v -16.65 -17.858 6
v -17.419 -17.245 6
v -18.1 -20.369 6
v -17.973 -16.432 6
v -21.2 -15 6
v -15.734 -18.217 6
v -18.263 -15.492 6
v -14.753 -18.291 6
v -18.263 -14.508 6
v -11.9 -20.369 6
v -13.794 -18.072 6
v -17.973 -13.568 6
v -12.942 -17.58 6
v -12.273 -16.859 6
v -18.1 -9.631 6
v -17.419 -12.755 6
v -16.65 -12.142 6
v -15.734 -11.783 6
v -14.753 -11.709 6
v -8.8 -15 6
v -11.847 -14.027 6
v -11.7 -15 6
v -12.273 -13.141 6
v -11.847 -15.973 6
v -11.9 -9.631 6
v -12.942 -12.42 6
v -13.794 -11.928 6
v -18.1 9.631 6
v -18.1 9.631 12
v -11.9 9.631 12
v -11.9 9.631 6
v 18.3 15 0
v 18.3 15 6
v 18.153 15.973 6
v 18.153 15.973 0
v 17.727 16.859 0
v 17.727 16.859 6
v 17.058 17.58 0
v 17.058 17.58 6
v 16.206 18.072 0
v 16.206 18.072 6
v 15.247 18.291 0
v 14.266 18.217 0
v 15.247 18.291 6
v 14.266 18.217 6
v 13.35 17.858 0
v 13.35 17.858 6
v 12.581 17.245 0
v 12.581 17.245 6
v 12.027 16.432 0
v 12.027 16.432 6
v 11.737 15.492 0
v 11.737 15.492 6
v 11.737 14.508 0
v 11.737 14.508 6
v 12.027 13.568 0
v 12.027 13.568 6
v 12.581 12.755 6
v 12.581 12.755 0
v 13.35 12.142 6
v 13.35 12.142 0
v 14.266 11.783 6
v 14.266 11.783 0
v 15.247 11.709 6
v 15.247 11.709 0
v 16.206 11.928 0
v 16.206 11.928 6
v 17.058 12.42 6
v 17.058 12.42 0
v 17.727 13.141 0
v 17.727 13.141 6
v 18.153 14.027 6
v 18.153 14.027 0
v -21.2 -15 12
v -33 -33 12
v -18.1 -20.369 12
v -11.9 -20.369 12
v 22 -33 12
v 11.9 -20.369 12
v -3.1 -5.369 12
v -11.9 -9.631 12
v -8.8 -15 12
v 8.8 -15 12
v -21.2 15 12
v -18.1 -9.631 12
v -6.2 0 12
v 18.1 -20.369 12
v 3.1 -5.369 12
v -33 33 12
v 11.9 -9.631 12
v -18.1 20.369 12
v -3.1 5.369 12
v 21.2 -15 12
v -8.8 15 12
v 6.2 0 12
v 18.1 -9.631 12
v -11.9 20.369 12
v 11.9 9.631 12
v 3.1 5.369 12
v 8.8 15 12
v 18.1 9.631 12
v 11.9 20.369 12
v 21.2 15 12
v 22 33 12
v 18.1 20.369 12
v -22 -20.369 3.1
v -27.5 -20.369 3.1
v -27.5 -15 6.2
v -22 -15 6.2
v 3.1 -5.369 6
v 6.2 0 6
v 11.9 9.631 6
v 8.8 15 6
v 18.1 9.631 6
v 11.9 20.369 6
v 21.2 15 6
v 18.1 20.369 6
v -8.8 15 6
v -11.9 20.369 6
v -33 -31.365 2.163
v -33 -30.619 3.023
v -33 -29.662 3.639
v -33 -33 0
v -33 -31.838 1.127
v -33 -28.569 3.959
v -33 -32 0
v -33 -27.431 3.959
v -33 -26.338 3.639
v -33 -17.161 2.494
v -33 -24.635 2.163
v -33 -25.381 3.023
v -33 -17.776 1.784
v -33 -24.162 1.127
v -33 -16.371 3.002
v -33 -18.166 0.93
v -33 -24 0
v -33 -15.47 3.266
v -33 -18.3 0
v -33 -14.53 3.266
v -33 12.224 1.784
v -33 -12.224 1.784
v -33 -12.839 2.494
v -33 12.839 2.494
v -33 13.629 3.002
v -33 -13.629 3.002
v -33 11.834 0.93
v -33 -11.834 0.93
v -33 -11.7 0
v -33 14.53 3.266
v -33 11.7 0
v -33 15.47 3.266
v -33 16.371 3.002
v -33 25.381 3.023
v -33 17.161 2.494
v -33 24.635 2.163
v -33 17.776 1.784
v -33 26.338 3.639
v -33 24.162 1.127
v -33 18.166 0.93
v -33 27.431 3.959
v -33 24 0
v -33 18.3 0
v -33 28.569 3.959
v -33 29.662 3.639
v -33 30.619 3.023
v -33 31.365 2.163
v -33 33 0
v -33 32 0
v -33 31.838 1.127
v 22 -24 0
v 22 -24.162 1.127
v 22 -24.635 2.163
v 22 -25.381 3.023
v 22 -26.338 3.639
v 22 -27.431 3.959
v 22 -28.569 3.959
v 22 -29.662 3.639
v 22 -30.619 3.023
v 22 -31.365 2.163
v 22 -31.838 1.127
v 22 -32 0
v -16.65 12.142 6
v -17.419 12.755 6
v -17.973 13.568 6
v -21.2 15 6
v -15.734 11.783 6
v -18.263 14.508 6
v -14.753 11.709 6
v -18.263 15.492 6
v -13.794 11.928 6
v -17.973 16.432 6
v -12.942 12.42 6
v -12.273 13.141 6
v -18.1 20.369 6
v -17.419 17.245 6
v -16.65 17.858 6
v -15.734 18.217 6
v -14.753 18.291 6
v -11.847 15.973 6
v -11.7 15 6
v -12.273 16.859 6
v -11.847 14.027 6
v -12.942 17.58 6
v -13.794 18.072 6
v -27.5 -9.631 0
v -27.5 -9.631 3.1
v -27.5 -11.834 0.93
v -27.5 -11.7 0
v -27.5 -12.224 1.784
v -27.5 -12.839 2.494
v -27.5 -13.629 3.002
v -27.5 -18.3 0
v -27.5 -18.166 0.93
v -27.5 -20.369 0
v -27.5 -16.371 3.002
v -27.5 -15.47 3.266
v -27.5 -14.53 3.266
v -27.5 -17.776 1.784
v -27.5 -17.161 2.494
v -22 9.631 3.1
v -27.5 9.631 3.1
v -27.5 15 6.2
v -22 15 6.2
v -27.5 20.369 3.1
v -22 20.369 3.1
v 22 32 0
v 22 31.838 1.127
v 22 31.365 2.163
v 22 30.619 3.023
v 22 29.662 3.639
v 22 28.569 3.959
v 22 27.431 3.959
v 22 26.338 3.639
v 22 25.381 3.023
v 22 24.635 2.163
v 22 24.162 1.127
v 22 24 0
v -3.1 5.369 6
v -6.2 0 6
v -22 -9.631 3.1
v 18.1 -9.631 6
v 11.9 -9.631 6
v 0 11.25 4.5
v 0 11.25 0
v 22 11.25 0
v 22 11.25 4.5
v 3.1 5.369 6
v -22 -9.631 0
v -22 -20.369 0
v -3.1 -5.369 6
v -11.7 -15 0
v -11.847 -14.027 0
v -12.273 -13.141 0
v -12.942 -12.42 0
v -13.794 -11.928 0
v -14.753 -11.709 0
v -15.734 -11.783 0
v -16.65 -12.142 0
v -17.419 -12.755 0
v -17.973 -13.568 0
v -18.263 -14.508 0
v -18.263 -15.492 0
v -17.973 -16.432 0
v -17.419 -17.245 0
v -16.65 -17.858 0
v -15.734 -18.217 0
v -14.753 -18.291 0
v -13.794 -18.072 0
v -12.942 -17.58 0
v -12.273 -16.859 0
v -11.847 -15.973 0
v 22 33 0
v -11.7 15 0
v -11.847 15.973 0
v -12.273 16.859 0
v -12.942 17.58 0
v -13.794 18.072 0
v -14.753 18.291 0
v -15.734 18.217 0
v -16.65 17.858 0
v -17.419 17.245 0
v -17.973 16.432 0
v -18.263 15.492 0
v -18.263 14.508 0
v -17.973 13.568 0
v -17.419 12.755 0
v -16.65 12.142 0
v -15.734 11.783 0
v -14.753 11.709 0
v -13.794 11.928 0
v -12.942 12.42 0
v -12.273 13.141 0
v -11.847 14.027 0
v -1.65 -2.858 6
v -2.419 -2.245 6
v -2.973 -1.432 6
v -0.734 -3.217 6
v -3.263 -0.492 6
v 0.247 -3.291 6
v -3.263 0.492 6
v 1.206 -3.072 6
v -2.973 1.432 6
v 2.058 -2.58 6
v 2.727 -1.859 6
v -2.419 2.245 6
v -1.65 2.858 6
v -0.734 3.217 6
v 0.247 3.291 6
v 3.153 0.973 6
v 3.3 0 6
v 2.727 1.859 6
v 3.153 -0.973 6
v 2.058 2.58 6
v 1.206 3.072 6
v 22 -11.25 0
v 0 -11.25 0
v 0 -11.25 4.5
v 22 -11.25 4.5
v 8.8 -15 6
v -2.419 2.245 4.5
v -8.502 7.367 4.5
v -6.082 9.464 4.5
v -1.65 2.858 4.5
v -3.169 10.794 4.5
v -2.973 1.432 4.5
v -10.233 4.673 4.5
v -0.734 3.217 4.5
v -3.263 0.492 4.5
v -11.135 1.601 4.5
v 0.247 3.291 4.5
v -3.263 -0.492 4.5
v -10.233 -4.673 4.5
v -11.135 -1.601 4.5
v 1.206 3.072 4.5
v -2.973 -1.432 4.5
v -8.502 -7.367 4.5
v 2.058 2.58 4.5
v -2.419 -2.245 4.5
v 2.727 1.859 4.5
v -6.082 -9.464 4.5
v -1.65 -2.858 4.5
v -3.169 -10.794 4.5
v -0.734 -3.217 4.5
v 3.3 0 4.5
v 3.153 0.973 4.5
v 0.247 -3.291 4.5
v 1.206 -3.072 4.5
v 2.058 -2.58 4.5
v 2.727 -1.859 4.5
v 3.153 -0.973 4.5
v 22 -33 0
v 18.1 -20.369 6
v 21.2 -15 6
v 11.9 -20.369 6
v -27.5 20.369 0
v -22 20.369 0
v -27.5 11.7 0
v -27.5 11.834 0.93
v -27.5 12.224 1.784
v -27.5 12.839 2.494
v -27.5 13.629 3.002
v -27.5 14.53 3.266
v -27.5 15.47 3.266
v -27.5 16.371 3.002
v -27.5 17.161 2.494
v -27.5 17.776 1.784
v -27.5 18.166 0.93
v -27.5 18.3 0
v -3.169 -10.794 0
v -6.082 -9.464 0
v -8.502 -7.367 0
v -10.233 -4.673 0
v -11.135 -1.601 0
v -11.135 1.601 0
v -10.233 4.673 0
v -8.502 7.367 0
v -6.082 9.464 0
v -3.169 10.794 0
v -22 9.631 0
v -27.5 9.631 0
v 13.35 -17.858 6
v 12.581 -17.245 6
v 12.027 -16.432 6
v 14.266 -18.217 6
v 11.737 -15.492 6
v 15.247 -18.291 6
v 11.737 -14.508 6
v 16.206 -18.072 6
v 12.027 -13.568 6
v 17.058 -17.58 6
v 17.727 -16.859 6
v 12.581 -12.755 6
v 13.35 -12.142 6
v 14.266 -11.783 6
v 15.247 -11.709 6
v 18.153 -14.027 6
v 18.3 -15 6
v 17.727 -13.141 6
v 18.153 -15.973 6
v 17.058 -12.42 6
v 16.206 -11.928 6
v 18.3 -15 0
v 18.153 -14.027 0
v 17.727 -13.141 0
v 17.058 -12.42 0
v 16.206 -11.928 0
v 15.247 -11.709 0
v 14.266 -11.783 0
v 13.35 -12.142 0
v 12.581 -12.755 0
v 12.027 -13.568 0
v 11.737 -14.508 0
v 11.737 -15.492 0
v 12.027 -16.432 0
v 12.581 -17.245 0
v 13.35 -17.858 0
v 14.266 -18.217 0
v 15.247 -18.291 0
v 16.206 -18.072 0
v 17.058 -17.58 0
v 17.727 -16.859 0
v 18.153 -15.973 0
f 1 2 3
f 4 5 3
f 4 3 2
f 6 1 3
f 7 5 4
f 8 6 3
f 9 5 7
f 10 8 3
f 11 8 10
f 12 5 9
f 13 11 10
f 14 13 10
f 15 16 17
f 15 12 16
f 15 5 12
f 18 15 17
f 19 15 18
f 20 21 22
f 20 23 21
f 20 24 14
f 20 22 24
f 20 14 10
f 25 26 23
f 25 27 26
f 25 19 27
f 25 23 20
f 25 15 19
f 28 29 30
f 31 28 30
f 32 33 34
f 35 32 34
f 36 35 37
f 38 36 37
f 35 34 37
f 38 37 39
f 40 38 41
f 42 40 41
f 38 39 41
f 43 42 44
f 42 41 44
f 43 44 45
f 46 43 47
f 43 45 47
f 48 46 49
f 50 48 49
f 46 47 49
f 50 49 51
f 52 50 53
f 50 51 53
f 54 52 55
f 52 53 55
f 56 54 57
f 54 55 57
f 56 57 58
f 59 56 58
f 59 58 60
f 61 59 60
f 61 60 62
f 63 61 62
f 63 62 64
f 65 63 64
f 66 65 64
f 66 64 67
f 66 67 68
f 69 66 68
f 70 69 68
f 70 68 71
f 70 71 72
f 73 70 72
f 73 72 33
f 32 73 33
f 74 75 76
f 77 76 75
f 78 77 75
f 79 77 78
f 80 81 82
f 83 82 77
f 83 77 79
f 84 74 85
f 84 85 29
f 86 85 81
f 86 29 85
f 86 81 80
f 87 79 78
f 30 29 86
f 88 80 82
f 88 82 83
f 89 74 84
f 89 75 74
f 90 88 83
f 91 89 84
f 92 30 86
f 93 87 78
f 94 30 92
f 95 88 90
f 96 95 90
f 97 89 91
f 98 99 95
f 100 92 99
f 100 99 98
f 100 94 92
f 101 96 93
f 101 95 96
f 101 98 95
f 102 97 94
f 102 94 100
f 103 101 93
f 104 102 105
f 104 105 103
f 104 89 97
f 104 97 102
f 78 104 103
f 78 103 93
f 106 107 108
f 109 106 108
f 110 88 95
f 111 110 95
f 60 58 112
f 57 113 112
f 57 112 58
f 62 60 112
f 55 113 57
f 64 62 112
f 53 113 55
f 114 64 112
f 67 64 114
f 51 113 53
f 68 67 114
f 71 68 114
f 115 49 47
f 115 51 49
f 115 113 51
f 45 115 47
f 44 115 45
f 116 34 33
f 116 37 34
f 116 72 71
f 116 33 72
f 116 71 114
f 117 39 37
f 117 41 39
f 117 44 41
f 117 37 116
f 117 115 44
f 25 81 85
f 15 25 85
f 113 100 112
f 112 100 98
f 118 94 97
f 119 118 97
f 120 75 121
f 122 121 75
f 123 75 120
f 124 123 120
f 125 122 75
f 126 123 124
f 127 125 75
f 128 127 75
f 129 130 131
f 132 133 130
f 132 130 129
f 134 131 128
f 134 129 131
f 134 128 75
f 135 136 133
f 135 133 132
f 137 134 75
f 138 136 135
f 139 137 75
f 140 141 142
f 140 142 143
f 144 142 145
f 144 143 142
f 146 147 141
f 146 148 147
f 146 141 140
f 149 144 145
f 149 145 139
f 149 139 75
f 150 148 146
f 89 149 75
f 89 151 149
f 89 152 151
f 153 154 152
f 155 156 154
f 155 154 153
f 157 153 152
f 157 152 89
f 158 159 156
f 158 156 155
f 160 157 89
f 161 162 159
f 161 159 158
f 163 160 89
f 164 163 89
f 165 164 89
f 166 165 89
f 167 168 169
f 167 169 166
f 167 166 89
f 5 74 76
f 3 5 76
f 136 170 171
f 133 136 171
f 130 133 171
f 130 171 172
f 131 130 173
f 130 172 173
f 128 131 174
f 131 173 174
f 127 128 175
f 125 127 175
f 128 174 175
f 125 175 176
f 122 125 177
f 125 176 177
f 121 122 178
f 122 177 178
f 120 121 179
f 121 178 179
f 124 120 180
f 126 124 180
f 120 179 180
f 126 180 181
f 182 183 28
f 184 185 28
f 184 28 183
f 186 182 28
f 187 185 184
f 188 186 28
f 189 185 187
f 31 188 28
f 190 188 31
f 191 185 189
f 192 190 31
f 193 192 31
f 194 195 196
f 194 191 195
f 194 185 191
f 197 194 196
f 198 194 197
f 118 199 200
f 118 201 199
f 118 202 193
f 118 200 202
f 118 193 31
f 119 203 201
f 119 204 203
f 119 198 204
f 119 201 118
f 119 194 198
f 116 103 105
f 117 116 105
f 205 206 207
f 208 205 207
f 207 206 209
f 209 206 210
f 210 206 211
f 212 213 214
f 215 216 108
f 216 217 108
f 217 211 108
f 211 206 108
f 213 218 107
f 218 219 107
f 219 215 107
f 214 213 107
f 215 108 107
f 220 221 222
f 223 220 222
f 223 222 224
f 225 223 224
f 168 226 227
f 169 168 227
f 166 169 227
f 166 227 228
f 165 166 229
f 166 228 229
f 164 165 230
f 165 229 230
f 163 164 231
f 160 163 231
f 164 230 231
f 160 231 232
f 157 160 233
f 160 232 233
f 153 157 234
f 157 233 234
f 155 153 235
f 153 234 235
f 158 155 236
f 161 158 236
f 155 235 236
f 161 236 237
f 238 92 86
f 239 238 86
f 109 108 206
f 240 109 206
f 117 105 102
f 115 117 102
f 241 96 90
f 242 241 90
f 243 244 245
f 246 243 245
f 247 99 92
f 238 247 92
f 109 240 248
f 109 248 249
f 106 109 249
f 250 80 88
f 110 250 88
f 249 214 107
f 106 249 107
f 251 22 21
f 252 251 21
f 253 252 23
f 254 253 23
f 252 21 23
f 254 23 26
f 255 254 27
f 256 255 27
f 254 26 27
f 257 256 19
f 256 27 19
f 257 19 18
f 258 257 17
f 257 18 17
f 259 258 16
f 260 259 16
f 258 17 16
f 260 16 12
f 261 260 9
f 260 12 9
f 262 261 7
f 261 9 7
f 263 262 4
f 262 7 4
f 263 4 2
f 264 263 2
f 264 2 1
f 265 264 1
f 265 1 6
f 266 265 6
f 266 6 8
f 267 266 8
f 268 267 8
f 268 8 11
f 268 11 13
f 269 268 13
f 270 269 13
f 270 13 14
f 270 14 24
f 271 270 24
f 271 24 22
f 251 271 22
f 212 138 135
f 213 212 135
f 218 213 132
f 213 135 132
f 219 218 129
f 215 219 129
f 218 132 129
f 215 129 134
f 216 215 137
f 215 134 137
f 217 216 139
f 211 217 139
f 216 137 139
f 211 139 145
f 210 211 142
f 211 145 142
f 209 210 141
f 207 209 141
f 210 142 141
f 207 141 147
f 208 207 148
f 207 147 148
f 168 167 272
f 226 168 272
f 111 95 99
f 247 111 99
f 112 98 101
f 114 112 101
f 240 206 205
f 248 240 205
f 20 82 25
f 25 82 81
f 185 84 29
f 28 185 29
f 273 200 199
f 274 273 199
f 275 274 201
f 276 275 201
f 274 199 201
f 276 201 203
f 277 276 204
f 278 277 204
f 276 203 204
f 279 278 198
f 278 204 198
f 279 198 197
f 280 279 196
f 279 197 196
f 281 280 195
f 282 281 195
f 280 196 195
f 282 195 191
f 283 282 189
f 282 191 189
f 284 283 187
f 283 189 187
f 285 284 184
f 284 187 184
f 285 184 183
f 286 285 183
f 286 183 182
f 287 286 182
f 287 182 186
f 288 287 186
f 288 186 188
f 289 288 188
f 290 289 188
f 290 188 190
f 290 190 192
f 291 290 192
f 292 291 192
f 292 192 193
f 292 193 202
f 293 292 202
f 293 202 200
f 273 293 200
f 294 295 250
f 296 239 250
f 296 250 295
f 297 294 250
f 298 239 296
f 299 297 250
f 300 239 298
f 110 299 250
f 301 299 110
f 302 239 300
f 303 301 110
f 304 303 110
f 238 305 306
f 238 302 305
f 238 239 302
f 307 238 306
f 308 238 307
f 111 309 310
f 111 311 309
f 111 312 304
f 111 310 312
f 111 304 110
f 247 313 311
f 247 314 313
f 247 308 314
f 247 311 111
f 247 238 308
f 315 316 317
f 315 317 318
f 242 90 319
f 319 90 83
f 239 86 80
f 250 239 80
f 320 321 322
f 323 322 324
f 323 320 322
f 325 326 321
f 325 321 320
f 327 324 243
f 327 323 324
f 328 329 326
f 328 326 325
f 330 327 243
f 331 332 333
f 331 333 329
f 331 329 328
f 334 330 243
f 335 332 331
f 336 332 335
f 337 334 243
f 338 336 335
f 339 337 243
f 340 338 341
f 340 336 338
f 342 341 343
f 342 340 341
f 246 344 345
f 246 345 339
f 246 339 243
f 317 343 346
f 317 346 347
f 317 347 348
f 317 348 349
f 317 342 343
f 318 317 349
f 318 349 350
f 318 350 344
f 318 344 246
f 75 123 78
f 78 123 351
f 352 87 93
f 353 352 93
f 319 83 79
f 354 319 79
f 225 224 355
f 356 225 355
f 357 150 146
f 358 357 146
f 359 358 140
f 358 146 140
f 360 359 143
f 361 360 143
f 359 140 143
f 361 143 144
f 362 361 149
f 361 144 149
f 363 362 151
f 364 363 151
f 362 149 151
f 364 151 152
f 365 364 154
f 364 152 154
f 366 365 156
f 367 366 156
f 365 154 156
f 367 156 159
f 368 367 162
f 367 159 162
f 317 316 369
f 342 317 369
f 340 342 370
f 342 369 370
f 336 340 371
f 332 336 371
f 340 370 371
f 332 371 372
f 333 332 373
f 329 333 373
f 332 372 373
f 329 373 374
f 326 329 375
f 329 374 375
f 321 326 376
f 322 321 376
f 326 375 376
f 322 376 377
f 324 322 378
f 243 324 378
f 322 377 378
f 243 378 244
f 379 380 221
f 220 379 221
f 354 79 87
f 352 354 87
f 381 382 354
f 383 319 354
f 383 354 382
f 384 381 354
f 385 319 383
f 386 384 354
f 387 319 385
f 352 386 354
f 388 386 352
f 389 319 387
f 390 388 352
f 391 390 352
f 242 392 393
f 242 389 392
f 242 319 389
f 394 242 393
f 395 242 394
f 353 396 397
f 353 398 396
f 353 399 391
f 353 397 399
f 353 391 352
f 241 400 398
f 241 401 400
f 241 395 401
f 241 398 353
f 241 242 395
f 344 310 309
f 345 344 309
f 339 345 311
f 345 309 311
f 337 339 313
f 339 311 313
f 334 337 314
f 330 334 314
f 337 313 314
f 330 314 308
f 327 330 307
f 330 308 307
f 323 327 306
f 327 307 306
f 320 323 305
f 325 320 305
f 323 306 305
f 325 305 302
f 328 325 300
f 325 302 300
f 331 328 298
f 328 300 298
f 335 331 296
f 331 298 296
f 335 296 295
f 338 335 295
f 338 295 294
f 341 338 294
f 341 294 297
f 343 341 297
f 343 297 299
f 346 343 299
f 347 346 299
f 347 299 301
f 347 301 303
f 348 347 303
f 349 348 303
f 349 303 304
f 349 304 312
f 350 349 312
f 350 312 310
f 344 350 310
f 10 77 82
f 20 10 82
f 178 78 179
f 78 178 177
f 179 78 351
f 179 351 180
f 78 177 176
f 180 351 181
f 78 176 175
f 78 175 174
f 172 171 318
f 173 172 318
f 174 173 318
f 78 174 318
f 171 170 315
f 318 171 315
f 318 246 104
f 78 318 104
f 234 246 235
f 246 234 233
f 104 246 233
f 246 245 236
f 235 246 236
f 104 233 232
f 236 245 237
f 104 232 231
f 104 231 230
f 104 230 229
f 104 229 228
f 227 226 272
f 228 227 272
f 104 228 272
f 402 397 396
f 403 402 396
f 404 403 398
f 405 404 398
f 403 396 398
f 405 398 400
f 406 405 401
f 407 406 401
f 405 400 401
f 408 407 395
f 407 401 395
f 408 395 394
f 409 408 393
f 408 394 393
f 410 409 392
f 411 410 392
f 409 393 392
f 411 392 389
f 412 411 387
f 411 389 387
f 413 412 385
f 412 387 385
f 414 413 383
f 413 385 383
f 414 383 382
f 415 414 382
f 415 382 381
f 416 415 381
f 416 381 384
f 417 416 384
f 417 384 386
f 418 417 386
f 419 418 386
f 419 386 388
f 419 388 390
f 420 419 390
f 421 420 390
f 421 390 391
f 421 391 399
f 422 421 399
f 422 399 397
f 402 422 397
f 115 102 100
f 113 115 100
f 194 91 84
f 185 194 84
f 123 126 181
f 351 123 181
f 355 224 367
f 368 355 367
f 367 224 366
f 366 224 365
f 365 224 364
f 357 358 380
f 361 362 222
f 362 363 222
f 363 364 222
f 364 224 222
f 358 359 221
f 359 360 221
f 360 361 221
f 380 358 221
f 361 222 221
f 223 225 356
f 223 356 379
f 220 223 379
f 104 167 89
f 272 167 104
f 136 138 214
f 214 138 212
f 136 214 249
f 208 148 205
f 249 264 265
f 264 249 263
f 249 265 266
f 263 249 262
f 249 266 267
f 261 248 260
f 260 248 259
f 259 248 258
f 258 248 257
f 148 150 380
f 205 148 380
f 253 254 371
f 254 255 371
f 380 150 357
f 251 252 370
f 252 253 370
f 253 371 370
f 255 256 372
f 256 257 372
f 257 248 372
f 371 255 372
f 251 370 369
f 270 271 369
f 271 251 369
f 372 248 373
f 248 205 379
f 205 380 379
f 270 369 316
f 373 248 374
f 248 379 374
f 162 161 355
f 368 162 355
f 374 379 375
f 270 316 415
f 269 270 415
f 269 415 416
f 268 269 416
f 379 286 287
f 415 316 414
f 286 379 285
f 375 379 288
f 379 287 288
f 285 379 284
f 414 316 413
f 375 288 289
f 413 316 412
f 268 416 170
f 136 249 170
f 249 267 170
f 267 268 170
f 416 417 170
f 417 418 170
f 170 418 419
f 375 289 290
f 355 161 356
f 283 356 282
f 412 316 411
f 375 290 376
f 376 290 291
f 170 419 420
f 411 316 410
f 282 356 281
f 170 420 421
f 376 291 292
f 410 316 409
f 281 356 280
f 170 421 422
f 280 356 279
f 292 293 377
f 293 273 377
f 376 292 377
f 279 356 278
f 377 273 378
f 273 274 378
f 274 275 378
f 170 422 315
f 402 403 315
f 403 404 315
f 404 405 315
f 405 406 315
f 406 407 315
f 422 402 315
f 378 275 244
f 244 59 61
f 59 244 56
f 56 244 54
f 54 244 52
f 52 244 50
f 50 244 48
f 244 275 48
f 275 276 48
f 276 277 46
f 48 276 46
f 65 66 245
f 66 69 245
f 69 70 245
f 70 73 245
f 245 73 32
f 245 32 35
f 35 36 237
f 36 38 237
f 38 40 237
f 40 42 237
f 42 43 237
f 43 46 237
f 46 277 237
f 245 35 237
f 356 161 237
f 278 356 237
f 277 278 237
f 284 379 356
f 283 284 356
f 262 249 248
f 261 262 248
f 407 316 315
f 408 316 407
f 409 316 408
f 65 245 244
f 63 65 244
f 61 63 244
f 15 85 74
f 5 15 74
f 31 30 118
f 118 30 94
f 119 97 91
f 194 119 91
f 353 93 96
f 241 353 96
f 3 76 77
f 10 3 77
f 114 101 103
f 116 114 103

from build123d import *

# Parameters (mm, degrees)
SKETCH_W        = 55
SKETCH_H        = 66
PAD_DEPTH       = 12
POCKET_DEPTH    = 6
SKETCH002_R     = 3.3
POCKET001_DEPTH = 6.001
SKETCH003_R     = 4
POCKET002_DEPTH = 55.001
POCKET003_DEPTH = 4.5
SKETCH005_R     = 3.3
POCKET004_DEPTH = 5.5
POCKET005_DEPTH = 5.5


with BuildPart() as part:
    # Sketch → Pad (new body)
    with BuildSketch(Plane.XY):
        with Locations((-5.5, 0)):
            Rectangle(SKETCH_W, SKETCH_H)
    extrude(amount=PAD_DEPTH)

    # Sketch001 → Pocket (cut)
    with BuildSketch(Plane.XY.offset(12)):
        Polygon((18.1, 9.630642), (21.2, 15), (18.1, 20.369358), (11.9, 20.369358), (8.8, 15), (11.9, 9.630642), align=None)
        Polygon((-11.9, -20.369358), (-8.8, -15), (-11.9, -9.630642), (-18.1, -9.630642), (-21.2, -15), (-18.1, -20.369358), align=None)
        Polygon((11.9, -9.630642), (8.8, -15), (11.9, -20.369358), (18.1, -20.369358), (21.2, -15), (18.1, -9.630642), align=None)
        Polygon((-8.8, 15), (-11.9, 20.369358), (-18.1, 20.369358), (-21.2, 15), (-18.1, 9.630642), (-11.9, 9.630642), align=None)
        Polygon((3.1, -5.369358), (6.2, 0), (3.1, 5.369358), (-3.1, 5.369358), (-6.2, 0), (-3.1, -5.369358), align=None)
    extrude(amount=-POCKET_DEPTH, mode=Mode.SUBTRACT)

    # Sketch002 → Pocket001 (cut, through all)
    with BuildSketch(Plane.XY.offset(6)):
        with Locations((-15, 15)):
            Circle(SKETCH002_R)
        with Locations((15, 15)):
            Circle(SKETCH002_R)
        Circle(SKETCH002_R)
        with Locations((15, -15)):
            Circle(SKETCH002_R)
        with Locations((-15, -15)):
            Circle(SKETCH002_R)
    extrude(amount=-POCKET001_DEPTH, mode=Mode.SUBTRACT)

    # Sketch003 → Pocket002 (cut, through all)
    with BuildSketch(Plane.YZ.offset(22)):
        with Locations((-28, 0)):
            Circle(SKETCH003_R)
        with Locations((28, 0)):
            Circle(SKETCH003_R)
    extrude(amount=-POCKET002_DEPTH, mode=Mode.SUBTRACT)

    # Sketch004 → Pocket003 (cut)
    with BuildSketch(Plane(origin=(0, 0, 0), x_dir=(1, 0, 0), z_dir=(0, 0, -1))):
        with BuildLine():
            ThreePointArc((0, 11.25), (-11.25, 0), (0, -11.25))
            Line((0, -11.25), (22, -11.25))
            Line((22, 11.25), (22, -11.25))
            Line((0, 11.25), (22, 11.25))
        make_face()
    extrude(amount=-POCKET003_DEPTH, mode=Mode.SUBTRACT)

    # Sketch005 → Pocket004 (cut)
    with BuildSketch(Plane(origin=(-33, 0, 0), x_dir=(0, -1, 0), z_dir=(-1, 0, 0))):
        with Locations((-15, 0)):
            Circle(SKETCH005_R)
        with Locations((15, 0)):
            Circle(SKETCH005_R)
    extrude(amount=-POCKET004_DEPTH, mode=Mode.SUBTRACT)

    # Sketch006 → Pocket005 (cut)
    with BuildSketch(Plane(origin=(-27.5, 0, 0), x_dir=(0, -1, 0), z_dir=(-1, 0, 0))):
        Polygon((-9.630642, 3.1), (-15, 6.2), (-20.369358, 3.1), (-20.369358, -3.1), (-15, -6.2), (-9.630642, -3.1), align=None)
        Polygon((20.369358, 3.1), (15, 6.2), (9.630642, 3.1), (9.630642, -3.1), (15, -6.2), (20.369358, -3.1), align=None)
    extrude(amount=-POCKET005_DEPTH, mode=Mode.SUBTRACT)


solid = part.part
